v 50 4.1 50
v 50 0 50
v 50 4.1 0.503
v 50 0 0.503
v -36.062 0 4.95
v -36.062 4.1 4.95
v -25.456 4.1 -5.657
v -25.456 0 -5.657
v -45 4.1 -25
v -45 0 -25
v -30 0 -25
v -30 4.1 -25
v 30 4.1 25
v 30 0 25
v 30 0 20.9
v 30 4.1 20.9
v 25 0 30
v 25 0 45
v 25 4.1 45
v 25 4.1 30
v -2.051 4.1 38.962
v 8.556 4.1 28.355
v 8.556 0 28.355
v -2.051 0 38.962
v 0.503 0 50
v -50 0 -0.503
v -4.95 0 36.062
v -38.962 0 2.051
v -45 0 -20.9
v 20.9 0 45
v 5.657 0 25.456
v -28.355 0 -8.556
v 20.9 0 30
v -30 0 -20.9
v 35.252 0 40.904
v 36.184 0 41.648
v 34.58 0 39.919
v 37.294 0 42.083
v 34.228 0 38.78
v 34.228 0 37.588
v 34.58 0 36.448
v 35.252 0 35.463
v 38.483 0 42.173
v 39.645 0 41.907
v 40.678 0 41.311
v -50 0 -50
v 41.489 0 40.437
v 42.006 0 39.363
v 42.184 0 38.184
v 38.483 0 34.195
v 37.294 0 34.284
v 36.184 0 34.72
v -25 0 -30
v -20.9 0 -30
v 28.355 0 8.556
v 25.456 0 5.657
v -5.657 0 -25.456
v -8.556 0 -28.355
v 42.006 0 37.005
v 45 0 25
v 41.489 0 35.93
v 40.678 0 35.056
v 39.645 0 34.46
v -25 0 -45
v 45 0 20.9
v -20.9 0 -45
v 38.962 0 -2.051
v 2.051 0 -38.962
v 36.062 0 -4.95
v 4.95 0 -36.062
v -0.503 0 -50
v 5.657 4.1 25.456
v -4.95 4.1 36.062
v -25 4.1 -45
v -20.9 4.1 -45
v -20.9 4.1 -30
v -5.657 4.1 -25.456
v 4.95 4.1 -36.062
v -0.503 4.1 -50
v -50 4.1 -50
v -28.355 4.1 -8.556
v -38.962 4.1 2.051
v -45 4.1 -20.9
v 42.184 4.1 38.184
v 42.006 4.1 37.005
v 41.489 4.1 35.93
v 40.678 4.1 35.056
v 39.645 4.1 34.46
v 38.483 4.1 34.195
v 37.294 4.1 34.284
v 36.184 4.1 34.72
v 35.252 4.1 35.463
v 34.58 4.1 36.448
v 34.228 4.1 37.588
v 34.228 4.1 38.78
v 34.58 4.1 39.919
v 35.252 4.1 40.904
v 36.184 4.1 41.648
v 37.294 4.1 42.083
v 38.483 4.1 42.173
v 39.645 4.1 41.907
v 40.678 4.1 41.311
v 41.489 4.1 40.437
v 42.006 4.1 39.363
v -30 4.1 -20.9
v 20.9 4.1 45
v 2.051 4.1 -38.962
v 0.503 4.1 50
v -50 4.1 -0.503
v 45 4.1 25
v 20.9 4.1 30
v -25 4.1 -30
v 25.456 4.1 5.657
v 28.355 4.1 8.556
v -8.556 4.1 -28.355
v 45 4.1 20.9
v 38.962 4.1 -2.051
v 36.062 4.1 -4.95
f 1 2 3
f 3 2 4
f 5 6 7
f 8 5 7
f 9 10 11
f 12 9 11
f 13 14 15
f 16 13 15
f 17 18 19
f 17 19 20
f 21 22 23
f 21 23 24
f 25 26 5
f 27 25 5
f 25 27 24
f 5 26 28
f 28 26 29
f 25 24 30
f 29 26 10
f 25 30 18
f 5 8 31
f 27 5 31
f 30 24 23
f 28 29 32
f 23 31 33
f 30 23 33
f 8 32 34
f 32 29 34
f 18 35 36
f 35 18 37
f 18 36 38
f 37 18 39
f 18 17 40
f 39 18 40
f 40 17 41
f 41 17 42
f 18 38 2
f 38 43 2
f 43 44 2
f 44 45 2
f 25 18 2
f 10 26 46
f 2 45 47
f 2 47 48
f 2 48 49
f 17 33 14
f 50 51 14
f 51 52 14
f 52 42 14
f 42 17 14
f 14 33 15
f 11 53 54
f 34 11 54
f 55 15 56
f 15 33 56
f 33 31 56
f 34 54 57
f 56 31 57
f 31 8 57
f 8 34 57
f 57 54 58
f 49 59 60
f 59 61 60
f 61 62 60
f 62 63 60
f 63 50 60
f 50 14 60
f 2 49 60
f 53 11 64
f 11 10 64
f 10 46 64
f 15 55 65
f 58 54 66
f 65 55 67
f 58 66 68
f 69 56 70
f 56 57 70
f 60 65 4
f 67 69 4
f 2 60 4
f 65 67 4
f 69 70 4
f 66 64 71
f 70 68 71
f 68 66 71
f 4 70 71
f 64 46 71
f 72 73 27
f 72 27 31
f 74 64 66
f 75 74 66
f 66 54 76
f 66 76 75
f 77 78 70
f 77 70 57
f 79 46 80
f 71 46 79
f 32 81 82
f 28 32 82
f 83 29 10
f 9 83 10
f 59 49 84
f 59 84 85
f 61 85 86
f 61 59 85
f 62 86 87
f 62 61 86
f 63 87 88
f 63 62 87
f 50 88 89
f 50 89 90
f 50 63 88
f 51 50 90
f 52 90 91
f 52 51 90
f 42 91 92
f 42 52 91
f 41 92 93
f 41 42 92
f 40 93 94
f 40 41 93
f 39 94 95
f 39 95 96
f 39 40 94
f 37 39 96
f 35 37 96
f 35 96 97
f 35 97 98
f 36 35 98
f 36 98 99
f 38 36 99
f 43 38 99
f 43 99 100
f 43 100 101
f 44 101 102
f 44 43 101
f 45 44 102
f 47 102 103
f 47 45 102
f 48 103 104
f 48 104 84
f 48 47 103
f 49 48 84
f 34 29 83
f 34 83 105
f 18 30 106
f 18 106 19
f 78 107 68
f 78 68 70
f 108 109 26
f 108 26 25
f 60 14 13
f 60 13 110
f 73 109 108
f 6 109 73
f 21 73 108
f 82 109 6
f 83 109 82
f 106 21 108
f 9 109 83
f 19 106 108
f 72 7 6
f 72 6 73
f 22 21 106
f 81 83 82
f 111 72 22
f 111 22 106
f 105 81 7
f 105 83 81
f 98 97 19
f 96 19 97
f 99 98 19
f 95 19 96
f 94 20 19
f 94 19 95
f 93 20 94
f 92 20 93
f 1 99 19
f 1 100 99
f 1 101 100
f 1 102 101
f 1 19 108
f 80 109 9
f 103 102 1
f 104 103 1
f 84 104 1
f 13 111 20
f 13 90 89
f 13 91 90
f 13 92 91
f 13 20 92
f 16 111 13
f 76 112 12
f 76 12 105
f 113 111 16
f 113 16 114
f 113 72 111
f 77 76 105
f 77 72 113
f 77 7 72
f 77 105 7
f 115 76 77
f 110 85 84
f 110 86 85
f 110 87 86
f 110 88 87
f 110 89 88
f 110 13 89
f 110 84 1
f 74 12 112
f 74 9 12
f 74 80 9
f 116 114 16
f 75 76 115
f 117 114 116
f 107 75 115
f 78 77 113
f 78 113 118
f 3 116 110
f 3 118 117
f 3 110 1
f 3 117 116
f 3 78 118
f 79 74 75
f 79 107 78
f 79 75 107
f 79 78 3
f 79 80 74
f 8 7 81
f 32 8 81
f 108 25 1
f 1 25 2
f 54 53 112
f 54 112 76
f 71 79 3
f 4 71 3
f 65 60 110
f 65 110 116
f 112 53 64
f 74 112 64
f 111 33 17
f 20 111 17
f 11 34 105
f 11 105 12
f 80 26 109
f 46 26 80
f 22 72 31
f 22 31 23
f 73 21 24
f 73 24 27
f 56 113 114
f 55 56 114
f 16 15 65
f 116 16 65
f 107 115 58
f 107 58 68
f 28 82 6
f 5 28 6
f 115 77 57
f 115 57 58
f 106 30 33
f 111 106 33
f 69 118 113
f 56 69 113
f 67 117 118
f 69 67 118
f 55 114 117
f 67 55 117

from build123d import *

# Parameters (mm, degrees)
SKETCH1_W           = 100
SKETCH1_H           = 100
SKETCH1_R           = 4
SKETCH1_W_2         = 4.1
SKETCH1_H_2         = 15
SKETCH1_W_3         = 15
SKETCH1_H_3         = 4.1
BOSS_EXTRUDE1_DEPTH = 4.1
CUT_EXTRUDE1_START  = 35
SKETCH2_W           = 141.421356238
SKETCH2_H           = 4.1
CUT_EXTRUDE1_DEPTH  = 35.710678
CUT_EXTRUDE2_REACH  = 107.711
CUT_EXTRUDE2_START  = -35
SKETCH3_W           = 141.421356238
SKETCH3_H           = 4.1
CUT_EXTRUDE3_DEPTH  = 5.1


with BuildPart() as part:
    # Sketch1 → Boss-Extrude1 (new body)
    with BuildSketch(Plane(origin=(0, 0, 0), x_dir=(1, 0, 0), z_dir=(0, 1, 0))):
        Rectangle(SKETCH1_W, SKETCH1_H)
        with Locations((38.183766184, -38.183766184)):
            Circle(SKETCH1_R, mode=Mode.SUBTRACT)
        with Locations((-22.95, 37.5)):
            Rectangle(SKETCH1_W_2, SKETCH1_H_2, mode=Mode.SUBTRACT)
        with Locations((-37.5, 22.95)):
            Rectangle(SKETCH1_W_3, SKETCH1_H_3, mode=Mode.SUBTRACT)
        with Locations((37.5, -22.95)):
            Rectangle(SKETCH1_W_3, SKETCH1_H_3, mode=Mode.SUBTRACT)
        with Locations((22.95, -37.5)):
            Rectangle(SKETCH1_W_2, SKETCH1_H_2, mode=Mode.SUBTRACT)
        with Locations((37.5, 22.95)):
            Rectangle(SKETCH1_W_3, SKETCH1_H_3, mode=Mode.SUBTRACT)
        with Locations((-37.5, -22.95)):
            Rectangle(SKETCH1_W_3, SKETCH1_H_3, mode=Mode.SUBTRACT)
        with Locations((22.95, 37.5)):
            Rectangle(SKETCH1_W_2, SKETCH1_H_2, mode=Mode.SUBTRACT)
        with Locations((-22.95, -37.5)):
            Rectangle(SKETCH1_W_2, SKETCH1_H_2, mode=Mode.SUBTRACT)
    extrude(amount=BOSS_EXTRUDE1_DEPTH)

    # Sketch2 → Cut-Extrude1 (cut)
    with BuildSketch(Plane(origin=(0, 0, 0), x_dir=(0.707106781, 0, 0.707106781), z_dir=(-0.707106781, 0, 0.707106781)).offset(CUT_EXTRUDE1_START)):
        with Locations((0, 2.05)):
            Rectangle(SKETCH2_W, SKETCH2_H)
    extrude(amount=CUT_EXTRUDE1_DEPTH, mode=Mode.SUBTRACT)

    # Sketch3 → Cut-Extrude2 (cut, up to next)
    with BuildSketch(Plane(origin=(0, 0, 0), x_dir=(0.707106781, 0, 0.707106781), z_dir=(-0.707106781, 0, 0.707106781)).offset(CUT_EXTRUDE2_START), mode=Mode.PRIVATE) as cut_extrude2_sk1:
        with Locations((0, 2.05)):
            Rectangle(SKETCH3_W, SKETCH3_H)
    cut_extrude2_tool1 = extrude(cut_extrude2_sk1.sketch, amount=-CUT_EXTRUDE2_REACH, mode=Mode.PRIVATE) & part.part
    add(cut_extrude2_tool1.solids().sort_by_distance((24.748737, 2.05, -24.748737))[0], mode=Mode.SUBTRACT)

    # Sketch4 → Cut-Extrude3 (cut, through all)
    with BuildSketch(Plane(origin=(0, 4.1, 0), x_dir=(1, 0, 0), z_dir=(0, 1, 0))):
        Polygon((-38.961583643, -2.050609665), (-36.062445841, -4.949747468), (-25.455844123, 5.656854249), (-28.354981926, 8.555992052), align=None)
        Polygon((8.555992052, -28.354981926), (-2.050609665, -38.961583643), (-4.949747468, -36.062445841), (5.656854249, -25.455844123), align=None)
        Polygon((38.961583643, 2.050609665), (36.062445841, 4.949747468), (25.455844123, -5.656854249), (28.354981926, -8.555992052), align=None)
        Polygon((-8.555992052, 28.354981926), (2.050609665, 38.961583643), (4.949747468, 36.062445841), (-5.656854249, 25.455844123), align=None)
    extrude(amount=-CUT_EXTRUDE3_DEPTH, mode=Mode.SUBTRACT)


solid = part.part
